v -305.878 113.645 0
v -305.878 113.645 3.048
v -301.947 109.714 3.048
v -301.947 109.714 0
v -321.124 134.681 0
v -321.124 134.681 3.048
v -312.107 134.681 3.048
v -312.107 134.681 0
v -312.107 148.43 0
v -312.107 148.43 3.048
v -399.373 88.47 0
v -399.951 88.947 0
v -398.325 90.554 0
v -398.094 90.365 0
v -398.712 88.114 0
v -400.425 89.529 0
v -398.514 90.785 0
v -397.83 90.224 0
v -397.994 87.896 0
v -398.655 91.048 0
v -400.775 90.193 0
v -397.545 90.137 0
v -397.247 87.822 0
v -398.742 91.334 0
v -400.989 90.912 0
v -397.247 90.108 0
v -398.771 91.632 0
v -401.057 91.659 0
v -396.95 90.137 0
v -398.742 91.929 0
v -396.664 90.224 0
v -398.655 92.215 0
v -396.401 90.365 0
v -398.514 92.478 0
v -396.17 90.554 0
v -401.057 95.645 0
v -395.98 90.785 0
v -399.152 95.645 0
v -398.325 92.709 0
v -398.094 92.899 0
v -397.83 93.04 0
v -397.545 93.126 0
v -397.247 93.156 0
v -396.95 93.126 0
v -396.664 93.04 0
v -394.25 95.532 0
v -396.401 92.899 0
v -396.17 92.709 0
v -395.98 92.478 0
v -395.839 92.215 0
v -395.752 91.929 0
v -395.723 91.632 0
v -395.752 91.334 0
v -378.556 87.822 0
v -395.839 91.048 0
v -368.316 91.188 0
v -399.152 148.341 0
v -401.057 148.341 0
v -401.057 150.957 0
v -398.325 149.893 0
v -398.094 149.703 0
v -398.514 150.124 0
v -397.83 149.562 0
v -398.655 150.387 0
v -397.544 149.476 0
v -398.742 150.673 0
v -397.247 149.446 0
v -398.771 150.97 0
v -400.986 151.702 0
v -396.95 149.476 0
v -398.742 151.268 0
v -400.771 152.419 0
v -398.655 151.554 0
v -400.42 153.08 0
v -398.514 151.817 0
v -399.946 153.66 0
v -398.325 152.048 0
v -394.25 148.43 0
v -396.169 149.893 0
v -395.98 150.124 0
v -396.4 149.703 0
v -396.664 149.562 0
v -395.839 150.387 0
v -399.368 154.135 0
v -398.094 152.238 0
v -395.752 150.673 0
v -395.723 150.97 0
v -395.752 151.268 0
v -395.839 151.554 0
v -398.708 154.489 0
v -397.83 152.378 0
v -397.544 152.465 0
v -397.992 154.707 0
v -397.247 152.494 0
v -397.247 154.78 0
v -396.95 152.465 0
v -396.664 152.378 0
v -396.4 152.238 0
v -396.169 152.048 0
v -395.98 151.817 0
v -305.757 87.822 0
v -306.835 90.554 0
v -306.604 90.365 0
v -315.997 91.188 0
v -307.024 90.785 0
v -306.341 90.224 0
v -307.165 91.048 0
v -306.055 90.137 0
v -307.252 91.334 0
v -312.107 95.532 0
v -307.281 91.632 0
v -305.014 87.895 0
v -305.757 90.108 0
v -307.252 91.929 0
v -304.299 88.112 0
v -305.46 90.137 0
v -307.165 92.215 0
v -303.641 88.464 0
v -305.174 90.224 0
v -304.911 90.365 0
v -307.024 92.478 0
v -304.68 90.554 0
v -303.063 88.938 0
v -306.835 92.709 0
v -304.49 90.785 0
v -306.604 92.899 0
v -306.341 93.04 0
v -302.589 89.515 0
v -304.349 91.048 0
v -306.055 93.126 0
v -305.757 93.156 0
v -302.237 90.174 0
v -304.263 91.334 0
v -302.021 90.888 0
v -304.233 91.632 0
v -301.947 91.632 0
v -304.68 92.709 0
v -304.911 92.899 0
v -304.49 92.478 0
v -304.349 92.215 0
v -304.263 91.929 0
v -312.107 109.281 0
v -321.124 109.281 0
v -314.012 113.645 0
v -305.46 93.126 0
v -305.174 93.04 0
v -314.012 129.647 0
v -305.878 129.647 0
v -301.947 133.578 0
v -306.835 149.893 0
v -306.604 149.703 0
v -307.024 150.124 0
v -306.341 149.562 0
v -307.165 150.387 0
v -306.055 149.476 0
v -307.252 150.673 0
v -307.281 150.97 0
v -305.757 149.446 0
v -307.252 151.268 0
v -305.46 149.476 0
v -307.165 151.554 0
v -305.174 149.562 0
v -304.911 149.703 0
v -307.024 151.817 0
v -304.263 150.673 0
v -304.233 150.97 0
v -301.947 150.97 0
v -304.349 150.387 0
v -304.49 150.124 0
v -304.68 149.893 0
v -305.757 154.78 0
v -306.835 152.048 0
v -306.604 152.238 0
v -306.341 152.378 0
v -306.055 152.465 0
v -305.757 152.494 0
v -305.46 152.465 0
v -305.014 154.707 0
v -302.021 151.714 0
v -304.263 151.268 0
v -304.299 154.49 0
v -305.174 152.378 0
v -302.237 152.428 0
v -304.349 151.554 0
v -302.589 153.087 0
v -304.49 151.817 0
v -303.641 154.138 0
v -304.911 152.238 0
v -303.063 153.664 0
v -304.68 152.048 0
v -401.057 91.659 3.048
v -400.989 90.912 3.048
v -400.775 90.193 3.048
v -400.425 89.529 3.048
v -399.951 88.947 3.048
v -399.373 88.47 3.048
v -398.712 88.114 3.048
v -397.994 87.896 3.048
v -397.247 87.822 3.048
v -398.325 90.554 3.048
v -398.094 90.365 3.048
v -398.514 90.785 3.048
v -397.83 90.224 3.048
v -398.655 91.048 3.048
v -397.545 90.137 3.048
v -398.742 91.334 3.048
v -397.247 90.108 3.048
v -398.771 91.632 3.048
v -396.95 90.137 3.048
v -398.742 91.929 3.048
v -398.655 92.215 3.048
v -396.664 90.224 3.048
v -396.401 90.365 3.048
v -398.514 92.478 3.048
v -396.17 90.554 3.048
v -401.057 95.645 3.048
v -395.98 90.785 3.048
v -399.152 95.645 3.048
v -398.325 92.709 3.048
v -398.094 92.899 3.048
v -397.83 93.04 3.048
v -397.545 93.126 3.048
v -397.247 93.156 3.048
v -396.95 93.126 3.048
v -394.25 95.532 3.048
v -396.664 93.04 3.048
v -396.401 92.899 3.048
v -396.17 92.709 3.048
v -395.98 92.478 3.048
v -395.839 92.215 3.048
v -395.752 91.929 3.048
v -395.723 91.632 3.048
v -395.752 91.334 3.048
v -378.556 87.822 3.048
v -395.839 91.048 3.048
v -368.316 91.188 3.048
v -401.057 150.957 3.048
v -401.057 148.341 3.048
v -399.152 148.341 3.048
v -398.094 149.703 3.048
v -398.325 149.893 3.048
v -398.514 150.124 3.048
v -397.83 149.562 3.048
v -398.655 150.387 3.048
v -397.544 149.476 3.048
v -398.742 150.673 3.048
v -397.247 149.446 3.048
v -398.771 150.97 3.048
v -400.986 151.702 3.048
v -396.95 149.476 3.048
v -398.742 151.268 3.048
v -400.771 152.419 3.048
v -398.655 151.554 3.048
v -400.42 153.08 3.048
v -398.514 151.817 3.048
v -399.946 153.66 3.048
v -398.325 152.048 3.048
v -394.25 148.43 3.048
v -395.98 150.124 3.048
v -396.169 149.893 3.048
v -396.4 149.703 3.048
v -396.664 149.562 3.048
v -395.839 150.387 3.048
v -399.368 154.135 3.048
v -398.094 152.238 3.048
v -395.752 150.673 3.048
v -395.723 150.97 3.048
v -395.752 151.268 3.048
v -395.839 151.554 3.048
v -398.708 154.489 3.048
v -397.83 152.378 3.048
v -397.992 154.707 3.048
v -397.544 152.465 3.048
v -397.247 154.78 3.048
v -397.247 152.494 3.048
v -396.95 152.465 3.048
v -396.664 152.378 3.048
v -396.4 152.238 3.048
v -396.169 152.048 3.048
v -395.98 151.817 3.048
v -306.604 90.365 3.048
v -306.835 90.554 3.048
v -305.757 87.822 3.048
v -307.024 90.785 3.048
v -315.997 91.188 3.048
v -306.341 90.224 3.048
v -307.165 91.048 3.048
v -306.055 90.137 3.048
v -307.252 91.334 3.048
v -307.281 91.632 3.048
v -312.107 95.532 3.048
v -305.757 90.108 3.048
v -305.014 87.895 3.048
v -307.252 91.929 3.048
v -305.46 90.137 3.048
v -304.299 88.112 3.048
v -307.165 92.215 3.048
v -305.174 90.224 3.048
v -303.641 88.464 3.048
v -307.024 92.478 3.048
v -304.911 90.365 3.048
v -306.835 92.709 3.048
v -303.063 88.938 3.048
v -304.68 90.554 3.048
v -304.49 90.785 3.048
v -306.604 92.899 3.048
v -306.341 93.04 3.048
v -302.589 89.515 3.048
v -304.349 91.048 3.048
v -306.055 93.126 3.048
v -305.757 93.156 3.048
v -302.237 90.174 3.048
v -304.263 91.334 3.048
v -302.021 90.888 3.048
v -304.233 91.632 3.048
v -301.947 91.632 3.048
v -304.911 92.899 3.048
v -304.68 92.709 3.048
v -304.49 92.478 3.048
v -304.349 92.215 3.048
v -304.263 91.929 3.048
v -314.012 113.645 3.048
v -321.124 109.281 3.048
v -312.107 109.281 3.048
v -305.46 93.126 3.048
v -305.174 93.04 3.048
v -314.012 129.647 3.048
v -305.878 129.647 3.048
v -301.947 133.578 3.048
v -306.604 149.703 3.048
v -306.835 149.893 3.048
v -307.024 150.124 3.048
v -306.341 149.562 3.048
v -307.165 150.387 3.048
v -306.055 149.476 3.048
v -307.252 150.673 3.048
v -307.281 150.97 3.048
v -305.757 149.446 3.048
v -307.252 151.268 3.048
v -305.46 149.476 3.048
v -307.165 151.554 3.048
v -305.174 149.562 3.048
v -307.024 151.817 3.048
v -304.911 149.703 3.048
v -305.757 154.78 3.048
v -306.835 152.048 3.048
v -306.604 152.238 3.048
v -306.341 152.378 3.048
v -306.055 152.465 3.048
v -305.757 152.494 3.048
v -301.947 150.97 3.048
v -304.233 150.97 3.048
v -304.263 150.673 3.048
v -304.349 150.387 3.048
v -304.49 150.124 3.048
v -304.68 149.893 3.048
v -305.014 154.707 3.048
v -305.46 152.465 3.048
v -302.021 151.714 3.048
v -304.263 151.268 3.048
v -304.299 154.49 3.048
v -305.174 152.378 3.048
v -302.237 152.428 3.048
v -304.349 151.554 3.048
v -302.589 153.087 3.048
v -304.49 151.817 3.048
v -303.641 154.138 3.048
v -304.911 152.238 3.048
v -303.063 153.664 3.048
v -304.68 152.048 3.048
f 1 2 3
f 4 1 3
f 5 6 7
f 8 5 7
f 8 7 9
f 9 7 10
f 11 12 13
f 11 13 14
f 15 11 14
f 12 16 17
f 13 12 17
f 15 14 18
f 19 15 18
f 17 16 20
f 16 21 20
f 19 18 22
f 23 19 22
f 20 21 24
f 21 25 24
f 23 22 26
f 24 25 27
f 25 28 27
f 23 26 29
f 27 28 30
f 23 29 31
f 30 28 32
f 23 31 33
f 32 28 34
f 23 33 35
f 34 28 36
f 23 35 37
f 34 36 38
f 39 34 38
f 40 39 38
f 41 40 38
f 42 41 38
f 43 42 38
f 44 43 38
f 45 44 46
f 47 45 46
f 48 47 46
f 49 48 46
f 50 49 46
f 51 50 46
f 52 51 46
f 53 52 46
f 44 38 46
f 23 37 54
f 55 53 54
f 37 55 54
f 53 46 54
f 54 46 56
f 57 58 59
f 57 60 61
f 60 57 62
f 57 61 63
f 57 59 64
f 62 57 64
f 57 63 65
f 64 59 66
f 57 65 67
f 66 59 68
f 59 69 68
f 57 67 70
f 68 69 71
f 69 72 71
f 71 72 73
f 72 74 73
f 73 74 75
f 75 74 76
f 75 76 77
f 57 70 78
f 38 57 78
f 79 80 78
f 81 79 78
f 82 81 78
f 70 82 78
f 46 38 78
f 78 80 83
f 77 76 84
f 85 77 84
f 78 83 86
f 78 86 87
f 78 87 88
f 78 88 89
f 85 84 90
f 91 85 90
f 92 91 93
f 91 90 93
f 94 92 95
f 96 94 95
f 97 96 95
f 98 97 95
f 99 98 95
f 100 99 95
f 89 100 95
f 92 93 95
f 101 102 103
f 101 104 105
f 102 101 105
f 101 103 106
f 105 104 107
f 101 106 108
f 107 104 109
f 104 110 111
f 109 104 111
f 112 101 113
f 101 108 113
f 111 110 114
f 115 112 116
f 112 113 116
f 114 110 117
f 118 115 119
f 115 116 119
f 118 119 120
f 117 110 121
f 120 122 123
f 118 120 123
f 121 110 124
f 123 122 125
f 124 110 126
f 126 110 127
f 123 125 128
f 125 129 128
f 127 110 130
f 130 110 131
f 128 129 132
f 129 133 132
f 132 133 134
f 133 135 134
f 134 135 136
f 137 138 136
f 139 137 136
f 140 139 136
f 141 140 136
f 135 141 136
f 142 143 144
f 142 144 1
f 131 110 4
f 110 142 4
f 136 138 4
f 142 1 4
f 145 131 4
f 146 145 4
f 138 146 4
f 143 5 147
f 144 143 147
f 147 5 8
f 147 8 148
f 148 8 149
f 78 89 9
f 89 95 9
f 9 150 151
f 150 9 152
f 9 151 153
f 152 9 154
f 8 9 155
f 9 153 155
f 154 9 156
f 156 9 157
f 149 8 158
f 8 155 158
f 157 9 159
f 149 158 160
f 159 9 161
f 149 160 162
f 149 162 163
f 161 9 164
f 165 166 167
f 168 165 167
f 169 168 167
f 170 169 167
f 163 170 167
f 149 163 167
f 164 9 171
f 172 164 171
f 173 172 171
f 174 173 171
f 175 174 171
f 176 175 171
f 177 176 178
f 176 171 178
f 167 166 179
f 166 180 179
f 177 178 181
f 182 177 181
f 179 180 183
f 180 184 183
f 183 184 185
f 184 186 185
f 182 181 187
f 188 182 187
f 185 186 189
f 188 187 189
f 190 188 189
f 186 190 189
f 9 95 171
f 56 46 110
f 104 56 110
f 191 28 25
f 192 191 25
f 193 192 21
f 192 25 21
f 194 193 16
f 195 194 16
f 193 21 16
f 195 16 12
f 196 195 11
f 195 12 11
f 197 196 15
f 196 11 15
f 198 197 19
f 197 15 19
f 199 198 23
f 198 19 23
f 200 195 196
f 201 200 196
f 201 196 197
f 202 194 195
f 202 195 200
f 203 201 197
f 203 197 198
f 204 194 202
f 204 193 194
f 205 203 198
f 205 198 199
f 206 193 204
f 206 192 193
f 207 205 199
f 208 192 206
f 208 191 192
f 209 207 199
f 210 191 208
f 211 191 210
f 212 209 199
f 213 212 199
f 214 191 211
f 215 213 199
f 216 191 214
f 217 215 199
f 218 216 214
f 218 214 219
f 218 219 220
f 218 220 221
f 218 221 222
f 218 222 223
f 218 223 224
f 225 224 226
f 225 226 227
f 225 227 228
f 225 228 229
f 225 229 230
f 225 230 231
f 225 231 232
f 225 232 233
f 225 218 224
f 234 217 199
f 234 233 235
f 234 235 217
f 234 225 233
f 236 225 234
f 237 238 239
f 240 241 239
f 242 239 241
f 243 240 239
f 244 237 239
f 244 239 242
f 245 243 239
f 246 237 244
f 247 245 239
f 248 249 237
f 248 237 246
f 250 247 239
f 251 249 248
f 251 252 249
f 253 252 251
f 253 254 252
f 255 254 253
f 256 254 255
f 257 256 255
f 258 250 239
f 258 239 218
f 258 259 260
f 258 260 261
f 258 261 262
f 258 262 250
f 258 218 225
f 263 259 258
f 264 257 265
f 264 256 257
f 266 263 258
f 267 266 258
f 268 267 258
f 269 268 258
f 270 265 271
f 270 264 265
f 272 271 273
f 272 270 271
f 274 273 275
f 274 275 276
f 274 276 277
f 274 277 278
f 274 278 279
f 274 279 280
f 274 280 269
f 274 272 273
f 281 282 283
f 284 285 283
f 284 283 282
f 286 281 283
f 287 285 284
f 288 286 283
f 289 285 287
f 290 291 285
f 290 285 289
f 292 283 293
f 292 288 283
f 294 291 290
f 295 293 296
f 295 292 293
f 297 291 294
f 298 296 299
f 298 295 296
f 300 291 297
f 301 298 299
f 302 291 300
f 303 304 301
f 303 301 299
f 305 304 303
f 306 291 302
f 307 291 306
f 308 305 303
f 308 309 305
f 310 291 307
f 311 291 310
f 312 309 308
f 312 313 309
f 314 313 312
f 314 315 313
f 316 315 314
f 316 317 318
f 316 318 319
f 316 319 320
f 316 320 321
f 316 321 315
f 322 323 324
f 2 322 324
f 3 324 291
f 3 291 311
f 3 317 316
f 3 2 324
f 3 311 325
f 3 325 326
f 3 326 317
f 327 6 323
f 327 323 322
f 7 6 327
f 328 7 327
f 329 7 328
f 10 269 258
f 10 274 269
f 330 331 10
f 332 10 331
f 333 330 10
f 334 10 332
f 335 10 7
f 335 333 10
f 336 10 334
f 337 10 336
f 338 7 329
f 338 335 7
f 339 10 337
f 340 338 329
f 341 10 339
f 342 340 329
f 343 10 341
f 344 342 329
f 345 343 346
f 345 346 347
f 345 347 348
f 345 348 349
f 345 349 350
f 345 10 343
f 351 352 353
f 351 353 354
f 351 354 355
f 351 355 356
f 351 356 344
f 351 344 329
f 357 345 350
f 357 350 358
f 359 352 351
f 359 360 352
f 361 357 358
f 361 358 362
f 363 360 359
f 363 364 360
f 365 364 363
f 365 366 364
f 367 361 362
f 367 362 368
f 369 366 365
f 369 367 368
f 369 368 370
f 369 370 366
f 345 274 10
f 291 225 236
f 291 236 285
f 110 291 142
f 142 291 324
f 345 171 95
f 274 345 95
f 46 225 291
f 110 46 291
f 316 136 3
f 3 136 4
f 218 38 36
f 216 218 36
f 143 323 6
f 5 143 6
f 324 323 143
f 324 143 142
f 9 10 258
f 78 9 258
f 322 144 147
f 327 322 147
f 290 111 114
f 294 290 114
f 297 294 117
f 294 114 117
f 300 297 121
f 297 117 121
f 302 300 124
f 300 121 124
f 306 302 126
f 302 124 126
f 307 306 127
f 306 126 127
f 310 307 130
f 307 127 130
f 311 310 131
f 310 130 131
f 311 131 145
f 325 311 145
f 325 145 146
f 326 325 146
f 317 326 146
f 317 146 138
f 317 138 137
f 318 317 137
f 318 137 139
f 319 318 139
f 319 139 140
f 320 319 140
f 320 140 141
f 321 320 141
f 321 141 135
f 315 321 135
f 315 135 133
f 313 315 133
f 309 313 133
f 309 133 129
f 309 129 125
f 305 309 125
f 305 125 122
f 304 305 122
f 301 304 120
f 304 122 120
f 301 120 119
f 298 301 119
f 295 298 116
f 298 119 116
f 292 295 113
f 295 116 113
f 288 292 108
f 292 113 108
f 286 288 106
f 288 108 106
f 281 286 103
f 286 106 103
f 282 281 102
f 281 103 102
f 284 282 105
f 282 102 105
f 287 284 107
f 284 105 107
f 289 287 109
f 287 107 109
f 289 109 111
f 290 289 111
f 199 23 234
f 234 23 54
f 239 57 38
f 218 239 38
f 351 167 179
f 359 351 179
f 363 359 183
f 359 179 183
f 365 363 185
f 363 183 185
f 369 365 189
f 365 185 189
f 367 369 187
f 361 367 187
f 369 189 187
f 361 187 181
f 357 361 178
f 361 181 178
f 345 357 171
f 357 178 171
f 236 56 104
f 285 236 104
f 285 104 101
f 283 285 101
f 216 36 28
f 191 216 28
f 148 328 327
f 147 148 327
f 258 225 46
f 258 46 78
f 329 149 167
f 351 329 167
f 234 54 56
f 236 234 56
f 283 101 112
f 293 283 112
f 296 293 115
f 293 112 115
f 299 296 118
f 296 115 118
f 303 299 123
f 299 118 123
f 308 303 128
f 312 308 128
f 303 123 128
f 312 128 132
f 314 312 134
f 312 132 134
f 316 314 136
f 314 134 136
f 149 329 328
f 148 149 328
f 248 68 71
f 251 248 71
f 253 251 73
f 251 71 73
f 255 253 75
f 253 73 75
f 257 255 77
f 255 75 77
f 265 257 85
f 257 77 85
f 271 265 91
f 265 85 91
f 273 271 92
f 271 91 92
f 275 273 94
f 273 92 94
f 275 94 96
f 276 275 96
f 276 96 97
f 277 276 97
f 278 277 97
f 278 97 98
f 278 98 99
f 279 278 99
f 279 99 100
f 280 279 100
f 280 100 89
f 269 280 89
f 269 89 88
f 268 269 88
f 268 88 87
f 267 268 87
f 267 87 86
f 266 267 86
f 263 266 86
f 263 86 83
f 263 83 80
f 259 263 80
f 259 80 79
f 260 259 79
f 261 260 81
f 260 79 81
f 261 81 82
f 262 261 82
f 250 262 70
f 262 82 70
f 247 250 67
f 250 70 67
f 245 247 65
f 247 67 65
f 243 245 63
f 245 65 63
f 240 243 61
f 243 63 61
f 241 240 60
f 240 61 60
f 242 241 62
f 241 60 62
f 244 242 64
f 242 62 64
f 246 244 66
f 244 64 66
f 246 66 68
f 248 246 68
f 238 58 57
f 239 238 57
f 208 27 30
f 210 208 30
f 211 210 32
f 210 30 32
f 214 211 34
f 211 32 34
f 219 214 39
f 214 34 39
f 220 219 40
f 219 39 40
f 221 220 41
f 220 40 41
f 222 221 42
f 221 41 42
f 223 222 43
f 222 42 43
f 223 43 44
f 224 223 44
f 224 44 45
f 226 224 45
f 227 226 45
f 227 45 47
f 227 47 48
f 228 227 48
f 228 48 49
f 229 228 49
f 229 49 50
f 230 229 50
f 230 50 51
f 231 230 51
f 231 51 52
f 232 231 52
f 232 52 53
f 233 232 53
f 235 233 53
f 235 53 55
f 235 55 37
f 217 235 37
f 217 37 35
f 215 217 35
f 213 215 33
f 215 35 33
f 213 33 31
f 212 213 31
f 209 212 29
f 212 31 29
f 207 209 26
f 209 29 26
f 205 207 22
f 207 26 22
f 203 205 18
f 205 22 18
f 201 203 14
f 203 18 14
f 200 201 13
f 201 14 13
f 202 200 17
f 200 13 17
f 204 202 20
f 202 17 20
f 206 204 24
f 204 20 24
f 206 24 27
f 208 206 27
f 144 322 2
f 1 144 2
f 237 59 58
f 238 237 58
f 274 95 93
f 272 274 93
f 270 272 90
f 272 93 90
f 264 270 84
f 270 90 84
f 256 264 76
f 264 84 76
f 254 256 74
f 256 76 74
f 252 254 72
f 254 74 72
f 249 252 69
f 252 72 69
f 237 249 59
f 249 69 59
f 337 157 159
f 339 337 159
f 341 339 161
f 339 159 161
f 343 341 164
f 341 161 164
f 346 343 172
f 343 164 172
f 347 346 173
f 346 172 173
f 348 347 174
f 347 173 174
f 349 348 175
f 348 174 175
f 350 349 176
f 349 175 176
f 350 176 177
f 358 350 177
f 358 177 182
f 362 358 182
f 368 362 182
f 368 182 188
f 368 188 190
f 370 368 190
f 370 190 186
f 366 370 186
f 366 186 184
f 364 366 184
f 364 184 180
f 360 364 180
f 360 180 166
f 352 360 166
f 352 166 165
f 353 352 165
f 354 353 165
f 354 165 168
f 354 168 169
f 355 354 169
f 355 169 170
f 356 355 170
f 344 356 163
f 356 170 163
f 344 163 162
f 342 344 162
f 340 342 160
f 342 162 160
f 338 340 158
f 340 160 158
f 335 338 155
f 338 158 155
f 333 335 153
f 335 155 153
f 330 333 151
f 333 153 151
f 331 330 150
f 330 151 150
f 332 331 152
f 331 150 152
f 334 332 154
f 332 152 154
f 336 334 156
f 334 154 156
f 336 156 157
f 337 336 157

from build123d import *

# Parameters (mm, degrees)
BOSS_EXTRUDE1_DEPTH = 3.048
SKETCH2_R           = 1.355900406
CUT_EXTRUDE1_DEPTH  = 430.898988368
SKETCH3_R           = 1.524
CUT_EXTRUDE2_DEPTH  = 430.898988368
CUT_EXTRUDE3_DEPTH  = 430.898988368
BOSS_EXTRUDE2_DEPTH = 3.048
SKETCH5_W           = 73.1256
SKETCH5_H           = 52.8987
SKETCH5_W_2         = 9.017
SKETCH5_H_2         = 13.74935
CUT_EXTRUDE4_DEPTH  = 430.898988368


with BuildPart() as part:
    # Sketch1 → Boss-Extrude1 (new body)
    with BuildSketch(Plane.XY):
        with BuildLine():
            Line((-309.8086, 128.8851), (-305.87795, 128.8851))
            Line((-305.87795, 128.8851), (-301.9473, 132.81575))
            Line((-301.9473, 132.81575), (-301.9473, 150.9704))
            ThreePointArc((-301.9473, 150.9704), (-303.063223164, 153.664476836), (-305.7573, 154.7804))
            Line((-305.7573, 154.7804), (-397.247125, 154.7804))
            ThreePointArc((-397.247125, 154.7804), (-399.946077222, 153.659592612), (-401.0571, 150.956597849))
            Line((-401.0571, 150.956597849), (-401.0571, 148.341))
            Line((-401.0571, 148.341), (-399.1521, 148.341))
            Line((-399.1521, 148.341), (-399.1521, 95.6449))
            Line((-399.1521, 95.6449), (-401.0571, 95.6449))
            Line((-401.0571, 95.6449), (-401.0571, 91.659304166))
            ThreePointArc((-401.0571, 91.659304166), (-399.951018769, 88.947400452), (-397.2472, 87.8217))
            Line((-397.2472, 87.8217), (-378.5565, 87.8217))
            Line((-378.5565, 87.8217), (-368.3165, 91.1883))
            Line((-368.3165, 91.1883), (-315.9973, 91.1883))
            Line((-315.9973, 91.1883), (-305.7573, 87.8217))
            ThreePointArc((-305.7573, 87.8217), (-303.063223164, 88.937623164), (-301.9473, 91.6317))
            Line((-301.9473, 91.6317), (-301.9473, 111.74645))
            Line((-301.9473, 111.74645), (-305.87795, 115.6771))
            Line((-305.87795, 115.6771), (-309.8086, 115.6771))
            Line((-309.8086, 115.6771), (-314.0123, 115.6771))
            Line((-314.0123, 115.6771), (-314.0123, 128.8851))
            Line((-314.0123, 128.8851), (-309.8086, 128.8851))
        make_face()
        Polygon((-395.3675, 92.9525), (-395.3675, 149.2432), (-309.8086, 149.2432), (-309.8086, 132.81575), (-318.2033, 132.81575), (-318.2033, 111.74645), (-309.8086, 111.74645), (-309.8086, 92.9525), align=None, mode=Mode.SUBTRACT)
    extrude(amount=BOSS_EXTRUDE1_DEPTH)

    # Sketch2 → Cut-Extrude1 (cut, through all)
    with BuildSketch(Plane(origin=(0, 0, 0), x_dir=(-1, 0, 0), z_dir=(0, 0, -1))):
        with Locations((305.7573, 150.9704)):
            Circle(SKETCH2_R)
        with Locations((397.247125, 150.9704)):
            Circle(SKETCH2_R)
        with Locations((397.2472, 91.6317)):
            Circle(SKETCH2_R)
        with Locations((305.7573, 91.6317)):
            Circle(SKETCH2_R)
    extrude(amount=-CUT_EXTRUDE1_DEPTH, mode=Mode.SUBTRACT)

    # Sketch3 → Cut-Extrude2 (cut, through all)
    with BuildSketch(Plane(origin=(0, 0, 0), x_dir=(-1, 0, 0), z_dir=(0, 0, -1))):
        with Locations((305.7573, 150.9704)):
            Circle(SKETCH3_R)
        with Locations((397.247125, 150.9704)):
            Circle(SKETCH3_R)
        with Locations((397.2472, 91.6317)):
            Circle(SKETCH3_R)
        with Locations((305.7573, 91.6317)):
            Circle(SKETCH3_R)
    extrude(amount=-CUT_EXTRUDE2_DEPTH, mode=Mode.SUBTRACT)

    # Sketch4 → Cut-Extrude3 (cut, through all)
    with BuildSketch(Plane.XY.offset(3.048)):
        Polygon((-301.9473, 133.57775), (-305.87795, 129.6471), (-314.0123, 129.6471), (-314.0123, 113.6451), (-305.87795, 113.6451), (-301.9473, 109.71445), align=None)
    extrude(amount=-CUT_EXTRUDE3_DEPTH, mode=Mode.SUBTRACT)

    # Sketch4<4> → Boss-Extrude2 (add)
    with BuildSketch(Plane.XY.offset(3.048)):
        Polygon((-318.2033, 111.74645), (-318.2033, 132.81575), (-309.8086, 132.81575), (-309.8086, 149.2432), (-395.3675, 149.2432), (-395.3675, 92.9525), (-309.8086, 92.9525), (-309.8086, 111.74645), align=None)
    extrude(amount=-BOSS_EXTRUDE2_DEPTH)

    # Sketch5 → Cut-Extrude4 (cut, through all)
    with BuildSketch(Plane.XY.offset(3.048)):
        with Locations((-357.6871, 121.98105)):
            Rectangle(SKETCH5_W, SKETCH5_H)
        with Locations((-316.6158, 141.555725)):
            Rectangle(SKETCH5_W_2, SKETCH5_H_2)
        with Locations((-316.6158, 102.406375)):
            Rectangle(SKETCH5_W_2, SKETCH5_H_2)
    extrude(amount=-CUT_EXTRUDE4_DEPTH, mode=Mode.SUBTRACT)


solid = part.part
